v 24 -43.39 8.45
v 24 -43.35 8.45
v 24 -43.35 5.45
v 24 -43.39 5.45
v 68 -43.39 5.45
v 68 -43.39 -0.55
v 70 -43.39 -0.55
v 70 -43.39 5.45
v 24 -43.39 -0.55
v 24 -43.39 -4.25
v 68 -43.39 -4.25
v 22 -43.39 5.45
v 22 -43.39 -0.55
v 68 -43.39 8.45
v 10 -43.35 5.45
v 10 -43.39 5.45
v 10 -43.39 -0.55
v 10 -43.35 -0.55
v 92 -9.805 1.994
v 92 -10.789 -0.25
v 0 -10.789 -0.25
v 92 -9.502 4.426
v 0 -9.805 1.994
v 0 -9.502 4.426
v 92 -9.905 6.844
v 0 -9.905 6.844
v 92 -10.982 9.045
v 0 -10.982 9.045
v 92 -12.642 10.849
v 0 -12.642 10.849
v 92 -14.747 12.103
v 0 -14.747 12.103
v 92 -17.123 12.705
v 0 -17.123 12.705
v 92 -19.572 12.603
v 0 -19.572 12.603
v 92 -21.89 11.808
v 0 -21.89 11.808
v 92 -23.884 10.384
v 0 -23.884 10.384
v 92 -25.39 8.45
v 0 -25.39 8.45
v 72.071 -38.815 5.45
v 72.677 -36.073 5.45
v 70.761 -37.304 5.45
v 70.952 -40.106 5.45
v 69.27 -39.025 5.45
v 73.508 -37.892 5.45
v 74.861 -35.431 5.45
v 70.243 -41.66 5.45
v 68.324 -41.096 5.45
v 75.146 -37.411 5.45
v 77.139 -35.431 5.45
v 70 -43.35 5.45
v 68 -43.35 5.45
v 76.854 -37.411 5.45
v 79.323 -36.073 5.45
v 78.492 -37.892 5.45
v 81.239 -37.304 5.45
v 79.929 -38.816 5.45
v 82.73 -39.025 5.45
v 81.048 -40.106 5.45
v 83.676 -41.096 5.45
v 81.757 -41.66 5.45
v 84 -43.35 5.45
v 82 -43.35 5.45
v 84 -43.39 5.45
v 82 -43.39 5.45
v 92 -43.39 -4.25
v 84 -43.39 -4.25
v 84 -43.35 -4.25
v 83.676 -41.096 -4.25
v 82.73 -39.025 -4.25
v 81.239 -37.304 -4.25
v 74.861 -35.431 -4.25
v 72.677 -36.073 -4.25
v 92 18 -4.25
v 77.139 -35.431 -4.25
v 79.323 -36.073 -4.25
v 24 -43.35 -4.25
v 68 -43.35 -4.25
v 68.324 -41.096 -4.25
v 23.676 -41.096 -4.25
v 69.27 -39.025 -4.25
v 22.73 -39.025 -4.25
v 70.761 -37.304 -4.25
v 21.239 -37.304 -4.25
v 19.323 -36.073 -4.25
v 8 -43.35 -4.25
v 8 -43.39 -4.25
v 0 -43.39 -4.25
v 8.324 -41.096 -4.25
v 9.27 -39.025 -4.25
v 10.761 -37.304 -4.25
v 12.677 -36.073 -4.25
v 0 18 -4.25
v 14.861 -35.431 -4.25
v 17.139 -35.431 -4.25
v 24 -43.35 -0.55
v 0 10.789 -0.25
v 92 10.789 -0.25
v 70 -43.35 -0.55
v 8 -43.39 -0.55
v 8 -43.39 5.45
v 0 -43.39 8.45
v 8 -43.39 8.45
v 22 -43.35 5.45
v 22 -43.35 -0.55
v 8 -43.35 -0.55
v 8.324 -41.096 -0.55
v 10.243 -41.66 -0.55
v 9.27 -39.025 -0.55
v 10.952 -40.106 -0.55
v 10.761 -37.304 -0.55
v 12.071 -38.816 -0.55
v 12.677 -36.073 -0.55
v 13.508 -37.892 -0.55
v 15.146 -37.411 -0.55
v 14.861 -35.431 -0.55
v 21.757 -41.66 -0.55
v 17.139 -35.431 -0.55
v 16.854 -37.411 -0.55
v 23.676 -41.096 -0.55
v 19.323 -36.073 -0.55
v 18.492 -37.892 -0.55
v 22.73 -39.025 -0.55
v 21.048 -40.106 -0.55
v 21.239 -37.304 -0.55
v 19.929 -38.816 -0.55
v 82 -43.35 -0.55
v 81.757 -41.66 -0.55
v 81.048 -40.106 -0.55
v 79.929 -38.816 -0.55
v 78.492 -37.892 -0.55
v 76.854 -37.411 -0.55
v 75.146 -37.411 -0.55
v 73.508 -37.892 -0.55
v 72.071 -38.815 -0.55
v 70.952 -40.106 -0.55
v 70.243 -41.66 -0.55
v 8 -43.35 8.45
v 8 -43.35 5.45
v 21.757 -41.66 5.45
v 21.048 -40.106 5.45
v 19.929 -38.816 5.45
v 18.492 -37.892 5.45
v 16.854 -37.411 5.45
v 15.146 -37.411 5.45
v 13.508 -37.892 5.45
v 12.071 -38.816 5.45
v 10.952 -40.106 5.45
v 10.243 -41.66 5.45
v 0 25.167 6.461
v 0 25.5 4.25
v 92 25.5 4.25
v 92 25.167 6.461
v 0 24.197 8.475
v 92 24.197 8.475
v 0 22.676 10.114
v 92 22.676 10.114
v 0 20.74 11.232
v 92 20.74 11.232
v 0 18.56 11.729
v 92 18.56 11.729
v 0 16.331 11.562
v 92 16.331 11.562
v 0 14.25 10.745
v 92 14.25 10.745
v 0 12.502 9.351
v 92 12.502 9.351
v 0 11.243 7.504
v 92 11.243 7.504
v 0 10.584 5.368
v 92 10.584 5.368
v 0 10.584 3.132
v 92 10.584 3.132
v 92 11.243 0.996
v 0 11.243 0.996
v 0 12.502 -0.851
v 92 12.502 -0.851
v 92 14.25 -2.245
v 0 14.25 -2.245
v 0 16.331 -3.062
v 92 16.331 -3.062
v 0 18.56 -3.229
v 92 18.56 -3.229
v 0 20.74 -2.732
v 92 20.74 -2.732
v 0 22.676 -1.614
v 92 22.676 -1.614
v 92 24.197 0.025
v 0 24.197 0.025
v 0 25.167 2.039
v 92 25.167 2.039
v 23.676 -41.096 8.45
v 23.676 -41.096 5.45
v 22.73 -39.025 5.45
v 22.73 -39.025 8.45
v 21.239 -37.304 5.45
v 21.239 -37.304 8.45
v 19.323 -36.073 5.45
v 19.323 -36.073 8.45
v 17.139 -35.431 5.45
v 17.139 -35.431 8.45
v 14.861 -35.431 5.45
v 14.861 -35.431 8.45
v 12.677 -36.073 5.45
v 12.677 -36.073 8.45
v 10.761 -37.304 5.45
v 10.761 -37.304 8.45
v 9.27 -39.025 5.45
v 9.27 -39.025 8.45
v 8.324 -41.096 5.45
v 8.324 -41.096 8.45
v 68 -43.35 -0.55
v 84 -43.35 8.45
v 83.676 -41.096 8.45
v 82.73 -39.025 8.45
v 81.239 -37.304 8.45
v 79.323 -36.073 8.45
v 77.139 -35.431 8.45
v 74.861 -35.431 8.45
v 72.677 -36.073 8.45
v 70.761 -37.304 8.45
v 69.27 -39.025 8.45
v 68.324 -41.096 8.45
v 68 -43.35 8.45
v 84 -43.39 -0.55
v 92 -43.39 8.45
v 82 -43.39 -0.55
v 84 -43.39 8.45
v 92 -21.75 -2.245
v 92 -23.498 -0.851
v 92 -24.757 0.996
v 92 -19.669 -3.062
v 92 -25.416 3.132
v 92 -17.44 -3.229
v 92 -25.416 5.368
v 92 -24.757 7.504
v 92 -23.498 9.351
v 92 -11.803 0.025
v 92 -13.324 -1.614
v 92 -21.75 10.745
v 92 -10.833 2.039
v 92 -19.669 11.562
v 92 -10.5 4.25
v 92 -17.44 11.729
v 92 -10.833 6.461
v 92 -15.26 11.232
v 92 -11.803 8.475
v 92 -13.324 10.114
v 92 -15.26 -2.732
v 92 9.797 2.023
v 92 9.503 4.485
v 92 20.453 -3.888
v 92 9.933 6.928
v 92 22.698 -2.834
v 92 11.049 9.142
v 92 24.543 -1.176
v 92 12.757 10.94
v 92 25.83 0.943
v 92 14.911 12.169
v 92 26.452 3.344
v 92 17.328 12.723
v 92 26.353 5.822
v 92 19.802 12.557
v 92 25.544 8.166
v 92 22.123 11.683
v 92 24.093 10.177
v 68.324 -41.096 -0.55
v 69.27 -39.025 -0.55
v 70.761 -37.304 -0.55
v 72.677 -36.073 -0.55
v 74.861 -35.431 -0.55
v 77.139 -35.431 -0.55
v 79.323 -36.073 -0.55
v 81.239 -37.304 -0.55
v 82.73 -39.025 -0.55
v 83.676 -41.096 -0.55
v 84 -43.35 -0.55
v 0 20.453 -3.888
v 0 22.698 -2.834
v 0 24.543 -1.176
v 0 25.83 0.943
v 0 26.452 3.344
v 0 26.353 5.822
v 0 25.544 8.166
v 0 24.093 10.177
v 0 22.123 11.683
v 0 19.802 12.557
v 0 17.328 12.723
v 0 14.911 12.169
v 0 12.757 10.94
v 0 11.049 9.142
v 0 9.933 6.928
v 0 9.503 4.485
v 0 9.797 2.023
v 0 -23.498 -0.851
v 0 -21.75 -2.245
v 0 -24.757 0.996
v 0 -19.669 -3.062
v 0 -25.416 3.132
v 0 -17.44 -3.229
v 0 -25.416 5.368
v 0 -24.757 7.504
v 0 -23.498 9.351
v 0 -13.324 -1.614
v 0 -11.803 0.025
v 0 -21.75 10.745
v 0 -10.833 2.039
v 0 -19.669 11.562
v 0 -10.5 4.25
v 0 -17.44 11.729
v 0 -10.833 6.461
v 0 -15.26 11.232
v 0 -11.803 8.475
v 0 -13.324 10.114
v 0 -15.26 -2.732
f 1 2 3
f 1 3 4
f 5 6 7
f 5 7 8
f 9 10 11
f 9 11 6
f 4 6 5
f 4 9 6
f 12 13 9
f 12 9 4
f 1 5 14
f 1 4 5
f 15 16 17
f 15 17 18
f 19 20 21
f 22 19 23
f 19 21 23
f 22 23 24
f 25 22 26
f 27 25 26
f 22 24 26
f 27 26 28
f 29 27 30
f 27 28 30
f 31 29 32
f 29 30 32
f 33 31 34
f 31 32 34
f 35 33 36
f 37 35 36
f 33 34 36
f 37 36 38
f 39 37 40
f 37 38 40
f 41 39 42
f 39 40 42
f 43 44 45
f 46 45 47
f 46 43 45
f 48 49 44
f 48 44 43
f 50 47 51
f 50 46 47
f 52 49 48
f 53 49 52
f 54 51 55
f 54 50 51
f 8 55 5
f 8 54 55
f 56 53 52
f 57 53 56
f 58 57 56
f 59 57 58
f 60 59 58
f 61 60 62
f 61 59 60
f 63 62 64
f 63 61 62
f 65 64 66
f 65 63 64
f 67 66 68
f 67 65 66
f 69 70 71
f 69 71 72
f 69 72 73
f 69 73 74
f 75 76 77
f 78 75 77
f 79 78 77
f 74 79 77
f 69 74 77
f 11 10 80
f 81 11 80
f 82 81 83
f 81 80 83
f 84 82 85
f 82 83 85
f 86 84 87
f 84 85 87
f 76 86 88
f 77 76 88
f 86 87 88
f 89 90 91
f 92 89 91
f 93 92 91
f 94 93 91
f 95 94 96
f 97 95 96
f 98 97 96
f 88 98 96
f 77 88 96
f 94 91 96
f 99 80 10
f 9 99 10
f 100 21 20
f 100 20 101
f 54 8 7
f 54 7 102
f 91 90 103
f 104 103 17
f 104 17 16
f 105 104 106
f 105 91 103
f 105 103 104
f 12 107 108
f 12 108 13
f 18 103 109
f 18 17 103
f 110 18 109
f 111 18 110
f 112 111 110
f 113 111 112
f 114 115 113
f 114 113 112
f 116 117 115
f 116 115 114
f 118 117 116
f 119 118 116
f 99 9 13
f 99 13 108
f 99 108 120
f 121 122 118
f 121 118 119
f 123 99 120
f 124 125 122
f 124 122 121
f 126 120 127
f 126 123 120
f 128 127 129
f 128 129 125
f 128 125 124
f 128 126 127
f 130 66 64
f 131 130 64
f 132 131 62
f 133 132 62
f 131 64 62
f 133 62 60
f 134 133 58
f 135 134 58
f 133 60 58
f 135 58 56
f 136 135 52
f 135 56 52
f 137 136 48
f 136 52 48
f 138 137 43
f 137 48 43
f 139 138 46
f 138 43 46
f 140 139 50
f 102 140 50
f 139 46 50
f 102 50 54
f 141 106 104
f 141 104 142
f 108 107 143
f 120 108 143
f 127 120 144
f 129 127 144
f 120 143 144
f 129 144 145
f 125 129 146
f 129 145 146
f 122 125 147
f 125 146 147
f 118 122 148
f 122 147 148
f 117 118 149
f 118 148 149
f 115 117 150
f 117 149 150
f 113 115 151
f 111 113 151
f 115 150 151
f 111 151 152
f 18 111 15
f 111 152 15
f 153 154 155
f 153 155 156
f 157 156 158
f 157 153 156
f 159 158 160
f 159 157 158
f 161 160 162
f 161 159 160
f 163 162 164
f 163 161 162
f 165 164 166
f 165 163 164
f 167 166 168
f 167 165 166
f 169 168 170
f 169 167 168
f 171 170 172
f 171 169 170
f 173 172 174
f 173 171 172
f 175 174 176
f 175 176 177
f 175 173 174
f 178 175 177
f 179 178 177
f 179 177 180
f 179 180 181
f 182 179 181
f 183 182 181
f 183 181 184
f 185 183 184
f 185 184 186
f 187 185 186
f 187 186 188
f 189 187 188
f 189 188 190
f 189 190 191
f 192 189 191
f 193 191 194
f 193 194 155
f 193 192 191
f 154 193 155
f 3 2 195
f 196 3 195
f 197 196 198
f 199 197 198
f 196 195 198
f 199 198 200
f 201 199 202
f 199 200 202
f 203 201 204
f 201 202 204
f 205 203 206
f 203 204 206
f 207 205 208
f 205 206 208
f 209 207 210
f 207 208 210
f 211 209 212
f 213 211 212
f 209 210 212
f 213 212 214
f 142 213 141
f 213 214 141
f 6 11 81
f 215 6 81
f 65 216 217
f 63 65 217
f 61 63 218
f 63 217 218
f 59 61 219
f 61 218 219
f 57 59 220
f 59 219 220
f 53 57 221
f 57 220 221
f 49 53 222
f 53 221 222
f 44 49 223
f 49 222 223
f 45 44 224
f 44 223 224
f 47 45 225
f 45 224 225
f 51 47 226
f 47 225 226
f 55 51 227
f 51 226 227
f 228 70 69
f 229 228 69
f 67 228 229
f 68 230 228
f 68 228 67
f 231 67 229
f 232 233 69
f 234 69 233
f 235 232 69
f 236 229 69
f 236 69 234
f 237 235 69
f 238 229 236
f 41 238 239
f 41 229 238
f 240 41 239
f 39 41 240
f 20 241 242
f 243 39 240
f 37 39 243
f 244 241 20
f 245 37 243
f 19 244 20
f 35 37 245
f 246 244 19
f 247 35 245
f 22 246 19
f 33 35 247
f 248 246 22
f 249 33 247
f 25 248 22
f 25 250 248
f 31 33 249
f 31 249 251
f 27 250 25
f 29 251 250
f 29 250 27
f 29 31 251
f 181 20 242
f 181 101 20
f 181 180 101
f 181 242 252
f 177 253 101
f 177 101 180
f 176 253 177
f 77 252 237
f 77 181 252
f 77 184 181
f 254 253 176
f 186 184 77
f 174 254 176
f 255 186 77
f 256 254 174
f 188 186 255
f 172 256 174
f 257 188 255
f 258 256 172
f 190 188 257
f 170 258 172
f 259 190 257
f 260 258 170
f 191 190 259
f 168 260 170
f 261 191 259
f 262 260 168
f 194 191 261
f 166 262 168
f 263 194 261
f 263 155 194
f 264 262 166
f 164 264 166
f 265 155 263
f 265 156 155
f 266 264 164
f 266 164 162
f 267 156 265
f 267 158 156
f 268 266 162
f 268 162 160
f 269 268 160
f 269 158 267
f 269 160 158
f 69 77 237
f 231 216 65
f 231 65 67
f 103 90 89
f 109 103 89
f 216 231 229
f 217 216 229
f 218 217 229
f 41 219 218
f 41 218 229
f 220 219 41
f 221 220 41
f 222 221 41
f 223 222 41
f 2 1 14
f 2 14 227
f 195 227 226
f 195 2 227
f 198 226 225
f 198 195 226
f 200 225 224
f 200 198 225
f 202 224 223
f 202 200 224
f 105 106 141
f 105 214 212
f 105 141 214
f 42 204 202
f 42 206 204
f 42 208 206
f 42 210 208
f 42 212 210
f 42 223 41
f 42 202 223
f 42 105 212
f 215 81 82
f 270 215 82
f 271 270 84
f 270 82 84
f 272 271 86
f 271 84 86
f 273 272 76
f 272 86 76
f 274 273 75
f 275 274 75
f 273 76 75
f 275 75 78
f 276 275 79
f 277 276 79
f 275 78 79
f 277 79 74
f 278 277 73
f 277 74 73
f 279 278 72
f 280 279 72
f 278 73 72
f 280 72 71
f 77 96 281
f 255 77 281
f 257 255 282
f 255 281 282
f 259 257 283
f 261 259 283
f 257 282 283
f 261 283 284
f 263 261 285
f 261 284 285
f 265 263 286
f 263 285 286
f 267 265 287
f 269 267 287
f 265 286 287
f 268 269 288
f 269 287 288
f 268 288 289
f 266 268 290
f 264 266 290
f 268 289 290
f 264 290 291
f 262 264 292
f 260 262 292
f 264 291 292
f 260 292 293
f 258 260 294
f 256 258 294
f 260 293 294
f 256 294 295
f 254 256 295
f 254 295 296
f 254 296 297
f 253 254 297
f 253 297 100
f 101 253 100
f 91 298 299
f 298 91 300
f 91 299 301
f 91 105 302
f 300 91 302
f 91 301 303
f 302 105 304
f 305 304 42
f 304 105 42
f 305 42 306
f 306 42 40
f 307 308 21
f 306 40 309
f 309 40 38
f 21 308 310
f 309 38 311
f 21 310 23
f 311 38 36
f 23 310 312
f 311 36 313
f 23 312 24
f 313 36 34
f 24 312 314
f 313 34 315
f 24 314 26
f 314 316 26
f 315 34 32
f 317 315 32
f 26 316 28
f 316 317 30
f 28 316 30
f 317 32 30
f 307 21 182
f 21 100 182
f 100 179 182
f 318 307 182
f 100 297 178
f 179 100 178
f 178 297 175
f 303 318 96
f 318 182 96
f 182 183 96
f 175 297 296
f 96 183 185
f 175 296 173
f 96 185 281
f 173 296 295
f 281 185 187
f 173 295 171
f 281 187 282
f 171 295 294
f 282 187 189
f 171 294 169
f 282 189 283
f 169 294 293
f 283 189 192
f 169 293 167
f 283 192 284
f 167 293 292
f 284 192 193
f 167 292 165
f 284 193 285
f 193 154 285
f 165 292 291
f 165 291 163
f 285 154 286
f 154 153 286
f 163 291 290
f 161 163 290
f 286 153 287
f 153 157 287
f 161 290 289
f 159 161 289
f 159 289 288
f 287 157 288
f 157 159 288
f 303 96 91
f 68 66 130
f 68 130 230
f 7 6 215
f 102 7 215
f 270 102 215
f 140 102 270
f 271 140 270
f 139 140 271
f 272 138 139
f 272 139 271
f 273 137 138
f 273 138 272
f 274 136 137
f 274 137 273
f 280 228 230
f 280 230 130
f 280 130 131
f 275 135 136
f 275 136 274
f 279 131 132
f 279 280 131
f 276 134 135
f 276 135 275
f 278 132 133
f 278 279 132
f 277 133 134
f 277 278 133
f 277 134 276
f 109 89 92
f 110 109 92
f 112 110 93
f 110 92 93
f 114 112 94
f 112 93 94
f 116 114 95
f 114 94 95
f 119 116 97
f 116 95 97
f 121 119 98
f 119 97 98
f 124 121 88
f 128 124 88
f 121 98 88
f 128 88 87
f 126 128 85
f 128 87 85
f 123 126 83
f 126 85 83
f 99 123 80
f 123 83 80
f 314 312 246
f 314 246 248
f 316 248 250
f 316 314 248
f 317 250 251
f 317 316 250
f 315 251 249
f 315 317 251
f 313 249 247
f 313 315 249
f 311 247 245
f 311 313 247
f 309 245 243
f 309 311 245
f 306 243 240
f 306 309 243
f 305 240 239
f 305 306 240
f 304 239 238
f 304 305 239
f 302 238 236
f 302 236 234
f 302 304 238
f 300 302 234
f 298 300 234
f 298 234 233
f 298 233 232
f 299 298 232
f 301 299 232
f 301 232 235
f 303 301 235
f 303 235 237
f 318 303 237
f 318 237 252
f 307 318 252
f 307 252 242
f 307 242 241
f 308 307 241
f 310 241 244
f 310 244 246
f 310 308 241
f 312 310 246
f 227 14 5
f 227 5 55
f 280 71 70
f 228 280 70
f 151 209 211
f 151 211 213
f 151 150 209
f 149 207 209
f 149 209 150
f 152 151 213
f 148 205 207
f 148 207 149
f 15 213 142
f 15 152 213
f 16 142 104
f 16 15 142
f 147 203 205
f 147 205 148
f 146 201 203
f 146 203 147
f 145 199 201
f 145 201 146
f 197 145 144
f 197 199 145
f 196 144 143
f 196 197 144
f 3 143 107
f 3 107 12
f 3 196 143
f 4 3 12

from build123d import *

# Parameters (mm, degrees)
SKETCH_R        = 7.5
PAD_DEPTH       = 92
POCKET_DEPTH    = 3
POCKET001_DEPTH = 9.701
POCKET002_DEPTH = 3.7


with BuildPart() as part:
    # Sketch → Pad (new body)
    with BuildSketch(Plane.YZ):
        with BuildLine():
            Line((-25.389858, -4.25), (17.999978, -4.25))
            ThreePointArc((17.999978, -4.25), (22.123115, 11.683029), (10.788897, -0.25))
            Line((-10.788897, -0.25), (10.788897, -0.25))
            ThreePointArc((-10.788897, -0.25), (-13.649082, 11.552021), (-25.389858, 8.45))
            Line((-43.389858, 8.45), (-25.389858, 8.45))
            Line((-43.389858, -4.25), (-43.389858, 8.45))
            Line((-25.389858, -4.25), (-43.389858, -4.25))
        make_face()
        with Locations((-18, 4.25)):
            Circle(SKETCH_R, mode=Mode.SUBTRACT)
        with Locations((18, 4.25)):
            Circle(SKETCH_R, mode=Mode.SUBTRACT)
    extrude(amount=PAD_DEPTH)

    # Sketch001 → Pocket (cut)
    with BuildSketch(Plane(origin=(0, 0, 8.45), x_dir=(0, -1, 0), z_dir=(0, 0, 1))):
        with BuildLine():
            ThreePointArc((43.35, 24), (35.35, 16), (43.35, 8))
            Line((50.35, 8), (43.35, 8))
            Line((50.35, 24), (50.35, 8))
            Line((43.35, 24), (50.35, 24))
        make_face()
        with BuildLine():
            ThreePointArc((43.349998, 84), (35.35, 76), (43.349998, 68))
            Line((59.835098, 68), (43.349998, 68))
            Line((59.835098, 84), (59.835098, 68))
            Line((43.349998, 84), (59.835098, 84))
        make_face()
    extrude(amount=-POCKET_DEPTH, mode=Mode.SUBTRACT)

    # Sketch002 → Pocket001 (cut, through all)
    with BuildSketch(Plane(origin=(0, 0, 5.45), x_dir=(0, -1, 0), z_dir=(0, 0, 1))):
        with BuildLine():
            ThreePointArc((43.35, 22), (37.35, 16), (43.35, 10))
            Line((53.35, 10), (43.35, 10))
            Line((53.35, 22), (53.35, 10))
            Line((43.35, 22), (53.35, 22))
        make_face()
        with BuildLine():
            ThreePointArc((43.35, 82), (37.35, 76.000014), (43.349973, 70))
            Line((53.35, 70), (43.349973, 70))
            Line((53.35, 82), (53.35, 70))
            Line((43.35, 82), (53.35, 82))
        make_face()
    extrude(amount=-POCKET001_DEPTH, mode=Mode.SUBTRACT)

    # Sketch003 → Pocket002 (cut)
    with BuildSketch(Plane.YX.offset(4.25)):
        with BuildLine():
            ThreePointArc((-43.349996, 68), (-35.35, 76.000002), (-43.35, 84))
            Line((-43.35, 84), (-53.35, 84))
            Line((-53.35, 84), (-53.35, 68))
            Line((-53.35, 68), (-43.349996, 68))
        make_face()
        with BuildLine():
            ThreePointArc((-43.35, 8), (-35.35, 16), (-43.35, 24))
            Line((-43.35, 24), (-53.350004, 24))
            Line((-53.350004, 24), (-53.350004, 8))
            Line((-53.350004, 8), (-43.35, 8))
        make_face()
    extrude(amount=-POCKET002_DEPTH, mode=Mode.SUBTRACT)


solid = part.part
